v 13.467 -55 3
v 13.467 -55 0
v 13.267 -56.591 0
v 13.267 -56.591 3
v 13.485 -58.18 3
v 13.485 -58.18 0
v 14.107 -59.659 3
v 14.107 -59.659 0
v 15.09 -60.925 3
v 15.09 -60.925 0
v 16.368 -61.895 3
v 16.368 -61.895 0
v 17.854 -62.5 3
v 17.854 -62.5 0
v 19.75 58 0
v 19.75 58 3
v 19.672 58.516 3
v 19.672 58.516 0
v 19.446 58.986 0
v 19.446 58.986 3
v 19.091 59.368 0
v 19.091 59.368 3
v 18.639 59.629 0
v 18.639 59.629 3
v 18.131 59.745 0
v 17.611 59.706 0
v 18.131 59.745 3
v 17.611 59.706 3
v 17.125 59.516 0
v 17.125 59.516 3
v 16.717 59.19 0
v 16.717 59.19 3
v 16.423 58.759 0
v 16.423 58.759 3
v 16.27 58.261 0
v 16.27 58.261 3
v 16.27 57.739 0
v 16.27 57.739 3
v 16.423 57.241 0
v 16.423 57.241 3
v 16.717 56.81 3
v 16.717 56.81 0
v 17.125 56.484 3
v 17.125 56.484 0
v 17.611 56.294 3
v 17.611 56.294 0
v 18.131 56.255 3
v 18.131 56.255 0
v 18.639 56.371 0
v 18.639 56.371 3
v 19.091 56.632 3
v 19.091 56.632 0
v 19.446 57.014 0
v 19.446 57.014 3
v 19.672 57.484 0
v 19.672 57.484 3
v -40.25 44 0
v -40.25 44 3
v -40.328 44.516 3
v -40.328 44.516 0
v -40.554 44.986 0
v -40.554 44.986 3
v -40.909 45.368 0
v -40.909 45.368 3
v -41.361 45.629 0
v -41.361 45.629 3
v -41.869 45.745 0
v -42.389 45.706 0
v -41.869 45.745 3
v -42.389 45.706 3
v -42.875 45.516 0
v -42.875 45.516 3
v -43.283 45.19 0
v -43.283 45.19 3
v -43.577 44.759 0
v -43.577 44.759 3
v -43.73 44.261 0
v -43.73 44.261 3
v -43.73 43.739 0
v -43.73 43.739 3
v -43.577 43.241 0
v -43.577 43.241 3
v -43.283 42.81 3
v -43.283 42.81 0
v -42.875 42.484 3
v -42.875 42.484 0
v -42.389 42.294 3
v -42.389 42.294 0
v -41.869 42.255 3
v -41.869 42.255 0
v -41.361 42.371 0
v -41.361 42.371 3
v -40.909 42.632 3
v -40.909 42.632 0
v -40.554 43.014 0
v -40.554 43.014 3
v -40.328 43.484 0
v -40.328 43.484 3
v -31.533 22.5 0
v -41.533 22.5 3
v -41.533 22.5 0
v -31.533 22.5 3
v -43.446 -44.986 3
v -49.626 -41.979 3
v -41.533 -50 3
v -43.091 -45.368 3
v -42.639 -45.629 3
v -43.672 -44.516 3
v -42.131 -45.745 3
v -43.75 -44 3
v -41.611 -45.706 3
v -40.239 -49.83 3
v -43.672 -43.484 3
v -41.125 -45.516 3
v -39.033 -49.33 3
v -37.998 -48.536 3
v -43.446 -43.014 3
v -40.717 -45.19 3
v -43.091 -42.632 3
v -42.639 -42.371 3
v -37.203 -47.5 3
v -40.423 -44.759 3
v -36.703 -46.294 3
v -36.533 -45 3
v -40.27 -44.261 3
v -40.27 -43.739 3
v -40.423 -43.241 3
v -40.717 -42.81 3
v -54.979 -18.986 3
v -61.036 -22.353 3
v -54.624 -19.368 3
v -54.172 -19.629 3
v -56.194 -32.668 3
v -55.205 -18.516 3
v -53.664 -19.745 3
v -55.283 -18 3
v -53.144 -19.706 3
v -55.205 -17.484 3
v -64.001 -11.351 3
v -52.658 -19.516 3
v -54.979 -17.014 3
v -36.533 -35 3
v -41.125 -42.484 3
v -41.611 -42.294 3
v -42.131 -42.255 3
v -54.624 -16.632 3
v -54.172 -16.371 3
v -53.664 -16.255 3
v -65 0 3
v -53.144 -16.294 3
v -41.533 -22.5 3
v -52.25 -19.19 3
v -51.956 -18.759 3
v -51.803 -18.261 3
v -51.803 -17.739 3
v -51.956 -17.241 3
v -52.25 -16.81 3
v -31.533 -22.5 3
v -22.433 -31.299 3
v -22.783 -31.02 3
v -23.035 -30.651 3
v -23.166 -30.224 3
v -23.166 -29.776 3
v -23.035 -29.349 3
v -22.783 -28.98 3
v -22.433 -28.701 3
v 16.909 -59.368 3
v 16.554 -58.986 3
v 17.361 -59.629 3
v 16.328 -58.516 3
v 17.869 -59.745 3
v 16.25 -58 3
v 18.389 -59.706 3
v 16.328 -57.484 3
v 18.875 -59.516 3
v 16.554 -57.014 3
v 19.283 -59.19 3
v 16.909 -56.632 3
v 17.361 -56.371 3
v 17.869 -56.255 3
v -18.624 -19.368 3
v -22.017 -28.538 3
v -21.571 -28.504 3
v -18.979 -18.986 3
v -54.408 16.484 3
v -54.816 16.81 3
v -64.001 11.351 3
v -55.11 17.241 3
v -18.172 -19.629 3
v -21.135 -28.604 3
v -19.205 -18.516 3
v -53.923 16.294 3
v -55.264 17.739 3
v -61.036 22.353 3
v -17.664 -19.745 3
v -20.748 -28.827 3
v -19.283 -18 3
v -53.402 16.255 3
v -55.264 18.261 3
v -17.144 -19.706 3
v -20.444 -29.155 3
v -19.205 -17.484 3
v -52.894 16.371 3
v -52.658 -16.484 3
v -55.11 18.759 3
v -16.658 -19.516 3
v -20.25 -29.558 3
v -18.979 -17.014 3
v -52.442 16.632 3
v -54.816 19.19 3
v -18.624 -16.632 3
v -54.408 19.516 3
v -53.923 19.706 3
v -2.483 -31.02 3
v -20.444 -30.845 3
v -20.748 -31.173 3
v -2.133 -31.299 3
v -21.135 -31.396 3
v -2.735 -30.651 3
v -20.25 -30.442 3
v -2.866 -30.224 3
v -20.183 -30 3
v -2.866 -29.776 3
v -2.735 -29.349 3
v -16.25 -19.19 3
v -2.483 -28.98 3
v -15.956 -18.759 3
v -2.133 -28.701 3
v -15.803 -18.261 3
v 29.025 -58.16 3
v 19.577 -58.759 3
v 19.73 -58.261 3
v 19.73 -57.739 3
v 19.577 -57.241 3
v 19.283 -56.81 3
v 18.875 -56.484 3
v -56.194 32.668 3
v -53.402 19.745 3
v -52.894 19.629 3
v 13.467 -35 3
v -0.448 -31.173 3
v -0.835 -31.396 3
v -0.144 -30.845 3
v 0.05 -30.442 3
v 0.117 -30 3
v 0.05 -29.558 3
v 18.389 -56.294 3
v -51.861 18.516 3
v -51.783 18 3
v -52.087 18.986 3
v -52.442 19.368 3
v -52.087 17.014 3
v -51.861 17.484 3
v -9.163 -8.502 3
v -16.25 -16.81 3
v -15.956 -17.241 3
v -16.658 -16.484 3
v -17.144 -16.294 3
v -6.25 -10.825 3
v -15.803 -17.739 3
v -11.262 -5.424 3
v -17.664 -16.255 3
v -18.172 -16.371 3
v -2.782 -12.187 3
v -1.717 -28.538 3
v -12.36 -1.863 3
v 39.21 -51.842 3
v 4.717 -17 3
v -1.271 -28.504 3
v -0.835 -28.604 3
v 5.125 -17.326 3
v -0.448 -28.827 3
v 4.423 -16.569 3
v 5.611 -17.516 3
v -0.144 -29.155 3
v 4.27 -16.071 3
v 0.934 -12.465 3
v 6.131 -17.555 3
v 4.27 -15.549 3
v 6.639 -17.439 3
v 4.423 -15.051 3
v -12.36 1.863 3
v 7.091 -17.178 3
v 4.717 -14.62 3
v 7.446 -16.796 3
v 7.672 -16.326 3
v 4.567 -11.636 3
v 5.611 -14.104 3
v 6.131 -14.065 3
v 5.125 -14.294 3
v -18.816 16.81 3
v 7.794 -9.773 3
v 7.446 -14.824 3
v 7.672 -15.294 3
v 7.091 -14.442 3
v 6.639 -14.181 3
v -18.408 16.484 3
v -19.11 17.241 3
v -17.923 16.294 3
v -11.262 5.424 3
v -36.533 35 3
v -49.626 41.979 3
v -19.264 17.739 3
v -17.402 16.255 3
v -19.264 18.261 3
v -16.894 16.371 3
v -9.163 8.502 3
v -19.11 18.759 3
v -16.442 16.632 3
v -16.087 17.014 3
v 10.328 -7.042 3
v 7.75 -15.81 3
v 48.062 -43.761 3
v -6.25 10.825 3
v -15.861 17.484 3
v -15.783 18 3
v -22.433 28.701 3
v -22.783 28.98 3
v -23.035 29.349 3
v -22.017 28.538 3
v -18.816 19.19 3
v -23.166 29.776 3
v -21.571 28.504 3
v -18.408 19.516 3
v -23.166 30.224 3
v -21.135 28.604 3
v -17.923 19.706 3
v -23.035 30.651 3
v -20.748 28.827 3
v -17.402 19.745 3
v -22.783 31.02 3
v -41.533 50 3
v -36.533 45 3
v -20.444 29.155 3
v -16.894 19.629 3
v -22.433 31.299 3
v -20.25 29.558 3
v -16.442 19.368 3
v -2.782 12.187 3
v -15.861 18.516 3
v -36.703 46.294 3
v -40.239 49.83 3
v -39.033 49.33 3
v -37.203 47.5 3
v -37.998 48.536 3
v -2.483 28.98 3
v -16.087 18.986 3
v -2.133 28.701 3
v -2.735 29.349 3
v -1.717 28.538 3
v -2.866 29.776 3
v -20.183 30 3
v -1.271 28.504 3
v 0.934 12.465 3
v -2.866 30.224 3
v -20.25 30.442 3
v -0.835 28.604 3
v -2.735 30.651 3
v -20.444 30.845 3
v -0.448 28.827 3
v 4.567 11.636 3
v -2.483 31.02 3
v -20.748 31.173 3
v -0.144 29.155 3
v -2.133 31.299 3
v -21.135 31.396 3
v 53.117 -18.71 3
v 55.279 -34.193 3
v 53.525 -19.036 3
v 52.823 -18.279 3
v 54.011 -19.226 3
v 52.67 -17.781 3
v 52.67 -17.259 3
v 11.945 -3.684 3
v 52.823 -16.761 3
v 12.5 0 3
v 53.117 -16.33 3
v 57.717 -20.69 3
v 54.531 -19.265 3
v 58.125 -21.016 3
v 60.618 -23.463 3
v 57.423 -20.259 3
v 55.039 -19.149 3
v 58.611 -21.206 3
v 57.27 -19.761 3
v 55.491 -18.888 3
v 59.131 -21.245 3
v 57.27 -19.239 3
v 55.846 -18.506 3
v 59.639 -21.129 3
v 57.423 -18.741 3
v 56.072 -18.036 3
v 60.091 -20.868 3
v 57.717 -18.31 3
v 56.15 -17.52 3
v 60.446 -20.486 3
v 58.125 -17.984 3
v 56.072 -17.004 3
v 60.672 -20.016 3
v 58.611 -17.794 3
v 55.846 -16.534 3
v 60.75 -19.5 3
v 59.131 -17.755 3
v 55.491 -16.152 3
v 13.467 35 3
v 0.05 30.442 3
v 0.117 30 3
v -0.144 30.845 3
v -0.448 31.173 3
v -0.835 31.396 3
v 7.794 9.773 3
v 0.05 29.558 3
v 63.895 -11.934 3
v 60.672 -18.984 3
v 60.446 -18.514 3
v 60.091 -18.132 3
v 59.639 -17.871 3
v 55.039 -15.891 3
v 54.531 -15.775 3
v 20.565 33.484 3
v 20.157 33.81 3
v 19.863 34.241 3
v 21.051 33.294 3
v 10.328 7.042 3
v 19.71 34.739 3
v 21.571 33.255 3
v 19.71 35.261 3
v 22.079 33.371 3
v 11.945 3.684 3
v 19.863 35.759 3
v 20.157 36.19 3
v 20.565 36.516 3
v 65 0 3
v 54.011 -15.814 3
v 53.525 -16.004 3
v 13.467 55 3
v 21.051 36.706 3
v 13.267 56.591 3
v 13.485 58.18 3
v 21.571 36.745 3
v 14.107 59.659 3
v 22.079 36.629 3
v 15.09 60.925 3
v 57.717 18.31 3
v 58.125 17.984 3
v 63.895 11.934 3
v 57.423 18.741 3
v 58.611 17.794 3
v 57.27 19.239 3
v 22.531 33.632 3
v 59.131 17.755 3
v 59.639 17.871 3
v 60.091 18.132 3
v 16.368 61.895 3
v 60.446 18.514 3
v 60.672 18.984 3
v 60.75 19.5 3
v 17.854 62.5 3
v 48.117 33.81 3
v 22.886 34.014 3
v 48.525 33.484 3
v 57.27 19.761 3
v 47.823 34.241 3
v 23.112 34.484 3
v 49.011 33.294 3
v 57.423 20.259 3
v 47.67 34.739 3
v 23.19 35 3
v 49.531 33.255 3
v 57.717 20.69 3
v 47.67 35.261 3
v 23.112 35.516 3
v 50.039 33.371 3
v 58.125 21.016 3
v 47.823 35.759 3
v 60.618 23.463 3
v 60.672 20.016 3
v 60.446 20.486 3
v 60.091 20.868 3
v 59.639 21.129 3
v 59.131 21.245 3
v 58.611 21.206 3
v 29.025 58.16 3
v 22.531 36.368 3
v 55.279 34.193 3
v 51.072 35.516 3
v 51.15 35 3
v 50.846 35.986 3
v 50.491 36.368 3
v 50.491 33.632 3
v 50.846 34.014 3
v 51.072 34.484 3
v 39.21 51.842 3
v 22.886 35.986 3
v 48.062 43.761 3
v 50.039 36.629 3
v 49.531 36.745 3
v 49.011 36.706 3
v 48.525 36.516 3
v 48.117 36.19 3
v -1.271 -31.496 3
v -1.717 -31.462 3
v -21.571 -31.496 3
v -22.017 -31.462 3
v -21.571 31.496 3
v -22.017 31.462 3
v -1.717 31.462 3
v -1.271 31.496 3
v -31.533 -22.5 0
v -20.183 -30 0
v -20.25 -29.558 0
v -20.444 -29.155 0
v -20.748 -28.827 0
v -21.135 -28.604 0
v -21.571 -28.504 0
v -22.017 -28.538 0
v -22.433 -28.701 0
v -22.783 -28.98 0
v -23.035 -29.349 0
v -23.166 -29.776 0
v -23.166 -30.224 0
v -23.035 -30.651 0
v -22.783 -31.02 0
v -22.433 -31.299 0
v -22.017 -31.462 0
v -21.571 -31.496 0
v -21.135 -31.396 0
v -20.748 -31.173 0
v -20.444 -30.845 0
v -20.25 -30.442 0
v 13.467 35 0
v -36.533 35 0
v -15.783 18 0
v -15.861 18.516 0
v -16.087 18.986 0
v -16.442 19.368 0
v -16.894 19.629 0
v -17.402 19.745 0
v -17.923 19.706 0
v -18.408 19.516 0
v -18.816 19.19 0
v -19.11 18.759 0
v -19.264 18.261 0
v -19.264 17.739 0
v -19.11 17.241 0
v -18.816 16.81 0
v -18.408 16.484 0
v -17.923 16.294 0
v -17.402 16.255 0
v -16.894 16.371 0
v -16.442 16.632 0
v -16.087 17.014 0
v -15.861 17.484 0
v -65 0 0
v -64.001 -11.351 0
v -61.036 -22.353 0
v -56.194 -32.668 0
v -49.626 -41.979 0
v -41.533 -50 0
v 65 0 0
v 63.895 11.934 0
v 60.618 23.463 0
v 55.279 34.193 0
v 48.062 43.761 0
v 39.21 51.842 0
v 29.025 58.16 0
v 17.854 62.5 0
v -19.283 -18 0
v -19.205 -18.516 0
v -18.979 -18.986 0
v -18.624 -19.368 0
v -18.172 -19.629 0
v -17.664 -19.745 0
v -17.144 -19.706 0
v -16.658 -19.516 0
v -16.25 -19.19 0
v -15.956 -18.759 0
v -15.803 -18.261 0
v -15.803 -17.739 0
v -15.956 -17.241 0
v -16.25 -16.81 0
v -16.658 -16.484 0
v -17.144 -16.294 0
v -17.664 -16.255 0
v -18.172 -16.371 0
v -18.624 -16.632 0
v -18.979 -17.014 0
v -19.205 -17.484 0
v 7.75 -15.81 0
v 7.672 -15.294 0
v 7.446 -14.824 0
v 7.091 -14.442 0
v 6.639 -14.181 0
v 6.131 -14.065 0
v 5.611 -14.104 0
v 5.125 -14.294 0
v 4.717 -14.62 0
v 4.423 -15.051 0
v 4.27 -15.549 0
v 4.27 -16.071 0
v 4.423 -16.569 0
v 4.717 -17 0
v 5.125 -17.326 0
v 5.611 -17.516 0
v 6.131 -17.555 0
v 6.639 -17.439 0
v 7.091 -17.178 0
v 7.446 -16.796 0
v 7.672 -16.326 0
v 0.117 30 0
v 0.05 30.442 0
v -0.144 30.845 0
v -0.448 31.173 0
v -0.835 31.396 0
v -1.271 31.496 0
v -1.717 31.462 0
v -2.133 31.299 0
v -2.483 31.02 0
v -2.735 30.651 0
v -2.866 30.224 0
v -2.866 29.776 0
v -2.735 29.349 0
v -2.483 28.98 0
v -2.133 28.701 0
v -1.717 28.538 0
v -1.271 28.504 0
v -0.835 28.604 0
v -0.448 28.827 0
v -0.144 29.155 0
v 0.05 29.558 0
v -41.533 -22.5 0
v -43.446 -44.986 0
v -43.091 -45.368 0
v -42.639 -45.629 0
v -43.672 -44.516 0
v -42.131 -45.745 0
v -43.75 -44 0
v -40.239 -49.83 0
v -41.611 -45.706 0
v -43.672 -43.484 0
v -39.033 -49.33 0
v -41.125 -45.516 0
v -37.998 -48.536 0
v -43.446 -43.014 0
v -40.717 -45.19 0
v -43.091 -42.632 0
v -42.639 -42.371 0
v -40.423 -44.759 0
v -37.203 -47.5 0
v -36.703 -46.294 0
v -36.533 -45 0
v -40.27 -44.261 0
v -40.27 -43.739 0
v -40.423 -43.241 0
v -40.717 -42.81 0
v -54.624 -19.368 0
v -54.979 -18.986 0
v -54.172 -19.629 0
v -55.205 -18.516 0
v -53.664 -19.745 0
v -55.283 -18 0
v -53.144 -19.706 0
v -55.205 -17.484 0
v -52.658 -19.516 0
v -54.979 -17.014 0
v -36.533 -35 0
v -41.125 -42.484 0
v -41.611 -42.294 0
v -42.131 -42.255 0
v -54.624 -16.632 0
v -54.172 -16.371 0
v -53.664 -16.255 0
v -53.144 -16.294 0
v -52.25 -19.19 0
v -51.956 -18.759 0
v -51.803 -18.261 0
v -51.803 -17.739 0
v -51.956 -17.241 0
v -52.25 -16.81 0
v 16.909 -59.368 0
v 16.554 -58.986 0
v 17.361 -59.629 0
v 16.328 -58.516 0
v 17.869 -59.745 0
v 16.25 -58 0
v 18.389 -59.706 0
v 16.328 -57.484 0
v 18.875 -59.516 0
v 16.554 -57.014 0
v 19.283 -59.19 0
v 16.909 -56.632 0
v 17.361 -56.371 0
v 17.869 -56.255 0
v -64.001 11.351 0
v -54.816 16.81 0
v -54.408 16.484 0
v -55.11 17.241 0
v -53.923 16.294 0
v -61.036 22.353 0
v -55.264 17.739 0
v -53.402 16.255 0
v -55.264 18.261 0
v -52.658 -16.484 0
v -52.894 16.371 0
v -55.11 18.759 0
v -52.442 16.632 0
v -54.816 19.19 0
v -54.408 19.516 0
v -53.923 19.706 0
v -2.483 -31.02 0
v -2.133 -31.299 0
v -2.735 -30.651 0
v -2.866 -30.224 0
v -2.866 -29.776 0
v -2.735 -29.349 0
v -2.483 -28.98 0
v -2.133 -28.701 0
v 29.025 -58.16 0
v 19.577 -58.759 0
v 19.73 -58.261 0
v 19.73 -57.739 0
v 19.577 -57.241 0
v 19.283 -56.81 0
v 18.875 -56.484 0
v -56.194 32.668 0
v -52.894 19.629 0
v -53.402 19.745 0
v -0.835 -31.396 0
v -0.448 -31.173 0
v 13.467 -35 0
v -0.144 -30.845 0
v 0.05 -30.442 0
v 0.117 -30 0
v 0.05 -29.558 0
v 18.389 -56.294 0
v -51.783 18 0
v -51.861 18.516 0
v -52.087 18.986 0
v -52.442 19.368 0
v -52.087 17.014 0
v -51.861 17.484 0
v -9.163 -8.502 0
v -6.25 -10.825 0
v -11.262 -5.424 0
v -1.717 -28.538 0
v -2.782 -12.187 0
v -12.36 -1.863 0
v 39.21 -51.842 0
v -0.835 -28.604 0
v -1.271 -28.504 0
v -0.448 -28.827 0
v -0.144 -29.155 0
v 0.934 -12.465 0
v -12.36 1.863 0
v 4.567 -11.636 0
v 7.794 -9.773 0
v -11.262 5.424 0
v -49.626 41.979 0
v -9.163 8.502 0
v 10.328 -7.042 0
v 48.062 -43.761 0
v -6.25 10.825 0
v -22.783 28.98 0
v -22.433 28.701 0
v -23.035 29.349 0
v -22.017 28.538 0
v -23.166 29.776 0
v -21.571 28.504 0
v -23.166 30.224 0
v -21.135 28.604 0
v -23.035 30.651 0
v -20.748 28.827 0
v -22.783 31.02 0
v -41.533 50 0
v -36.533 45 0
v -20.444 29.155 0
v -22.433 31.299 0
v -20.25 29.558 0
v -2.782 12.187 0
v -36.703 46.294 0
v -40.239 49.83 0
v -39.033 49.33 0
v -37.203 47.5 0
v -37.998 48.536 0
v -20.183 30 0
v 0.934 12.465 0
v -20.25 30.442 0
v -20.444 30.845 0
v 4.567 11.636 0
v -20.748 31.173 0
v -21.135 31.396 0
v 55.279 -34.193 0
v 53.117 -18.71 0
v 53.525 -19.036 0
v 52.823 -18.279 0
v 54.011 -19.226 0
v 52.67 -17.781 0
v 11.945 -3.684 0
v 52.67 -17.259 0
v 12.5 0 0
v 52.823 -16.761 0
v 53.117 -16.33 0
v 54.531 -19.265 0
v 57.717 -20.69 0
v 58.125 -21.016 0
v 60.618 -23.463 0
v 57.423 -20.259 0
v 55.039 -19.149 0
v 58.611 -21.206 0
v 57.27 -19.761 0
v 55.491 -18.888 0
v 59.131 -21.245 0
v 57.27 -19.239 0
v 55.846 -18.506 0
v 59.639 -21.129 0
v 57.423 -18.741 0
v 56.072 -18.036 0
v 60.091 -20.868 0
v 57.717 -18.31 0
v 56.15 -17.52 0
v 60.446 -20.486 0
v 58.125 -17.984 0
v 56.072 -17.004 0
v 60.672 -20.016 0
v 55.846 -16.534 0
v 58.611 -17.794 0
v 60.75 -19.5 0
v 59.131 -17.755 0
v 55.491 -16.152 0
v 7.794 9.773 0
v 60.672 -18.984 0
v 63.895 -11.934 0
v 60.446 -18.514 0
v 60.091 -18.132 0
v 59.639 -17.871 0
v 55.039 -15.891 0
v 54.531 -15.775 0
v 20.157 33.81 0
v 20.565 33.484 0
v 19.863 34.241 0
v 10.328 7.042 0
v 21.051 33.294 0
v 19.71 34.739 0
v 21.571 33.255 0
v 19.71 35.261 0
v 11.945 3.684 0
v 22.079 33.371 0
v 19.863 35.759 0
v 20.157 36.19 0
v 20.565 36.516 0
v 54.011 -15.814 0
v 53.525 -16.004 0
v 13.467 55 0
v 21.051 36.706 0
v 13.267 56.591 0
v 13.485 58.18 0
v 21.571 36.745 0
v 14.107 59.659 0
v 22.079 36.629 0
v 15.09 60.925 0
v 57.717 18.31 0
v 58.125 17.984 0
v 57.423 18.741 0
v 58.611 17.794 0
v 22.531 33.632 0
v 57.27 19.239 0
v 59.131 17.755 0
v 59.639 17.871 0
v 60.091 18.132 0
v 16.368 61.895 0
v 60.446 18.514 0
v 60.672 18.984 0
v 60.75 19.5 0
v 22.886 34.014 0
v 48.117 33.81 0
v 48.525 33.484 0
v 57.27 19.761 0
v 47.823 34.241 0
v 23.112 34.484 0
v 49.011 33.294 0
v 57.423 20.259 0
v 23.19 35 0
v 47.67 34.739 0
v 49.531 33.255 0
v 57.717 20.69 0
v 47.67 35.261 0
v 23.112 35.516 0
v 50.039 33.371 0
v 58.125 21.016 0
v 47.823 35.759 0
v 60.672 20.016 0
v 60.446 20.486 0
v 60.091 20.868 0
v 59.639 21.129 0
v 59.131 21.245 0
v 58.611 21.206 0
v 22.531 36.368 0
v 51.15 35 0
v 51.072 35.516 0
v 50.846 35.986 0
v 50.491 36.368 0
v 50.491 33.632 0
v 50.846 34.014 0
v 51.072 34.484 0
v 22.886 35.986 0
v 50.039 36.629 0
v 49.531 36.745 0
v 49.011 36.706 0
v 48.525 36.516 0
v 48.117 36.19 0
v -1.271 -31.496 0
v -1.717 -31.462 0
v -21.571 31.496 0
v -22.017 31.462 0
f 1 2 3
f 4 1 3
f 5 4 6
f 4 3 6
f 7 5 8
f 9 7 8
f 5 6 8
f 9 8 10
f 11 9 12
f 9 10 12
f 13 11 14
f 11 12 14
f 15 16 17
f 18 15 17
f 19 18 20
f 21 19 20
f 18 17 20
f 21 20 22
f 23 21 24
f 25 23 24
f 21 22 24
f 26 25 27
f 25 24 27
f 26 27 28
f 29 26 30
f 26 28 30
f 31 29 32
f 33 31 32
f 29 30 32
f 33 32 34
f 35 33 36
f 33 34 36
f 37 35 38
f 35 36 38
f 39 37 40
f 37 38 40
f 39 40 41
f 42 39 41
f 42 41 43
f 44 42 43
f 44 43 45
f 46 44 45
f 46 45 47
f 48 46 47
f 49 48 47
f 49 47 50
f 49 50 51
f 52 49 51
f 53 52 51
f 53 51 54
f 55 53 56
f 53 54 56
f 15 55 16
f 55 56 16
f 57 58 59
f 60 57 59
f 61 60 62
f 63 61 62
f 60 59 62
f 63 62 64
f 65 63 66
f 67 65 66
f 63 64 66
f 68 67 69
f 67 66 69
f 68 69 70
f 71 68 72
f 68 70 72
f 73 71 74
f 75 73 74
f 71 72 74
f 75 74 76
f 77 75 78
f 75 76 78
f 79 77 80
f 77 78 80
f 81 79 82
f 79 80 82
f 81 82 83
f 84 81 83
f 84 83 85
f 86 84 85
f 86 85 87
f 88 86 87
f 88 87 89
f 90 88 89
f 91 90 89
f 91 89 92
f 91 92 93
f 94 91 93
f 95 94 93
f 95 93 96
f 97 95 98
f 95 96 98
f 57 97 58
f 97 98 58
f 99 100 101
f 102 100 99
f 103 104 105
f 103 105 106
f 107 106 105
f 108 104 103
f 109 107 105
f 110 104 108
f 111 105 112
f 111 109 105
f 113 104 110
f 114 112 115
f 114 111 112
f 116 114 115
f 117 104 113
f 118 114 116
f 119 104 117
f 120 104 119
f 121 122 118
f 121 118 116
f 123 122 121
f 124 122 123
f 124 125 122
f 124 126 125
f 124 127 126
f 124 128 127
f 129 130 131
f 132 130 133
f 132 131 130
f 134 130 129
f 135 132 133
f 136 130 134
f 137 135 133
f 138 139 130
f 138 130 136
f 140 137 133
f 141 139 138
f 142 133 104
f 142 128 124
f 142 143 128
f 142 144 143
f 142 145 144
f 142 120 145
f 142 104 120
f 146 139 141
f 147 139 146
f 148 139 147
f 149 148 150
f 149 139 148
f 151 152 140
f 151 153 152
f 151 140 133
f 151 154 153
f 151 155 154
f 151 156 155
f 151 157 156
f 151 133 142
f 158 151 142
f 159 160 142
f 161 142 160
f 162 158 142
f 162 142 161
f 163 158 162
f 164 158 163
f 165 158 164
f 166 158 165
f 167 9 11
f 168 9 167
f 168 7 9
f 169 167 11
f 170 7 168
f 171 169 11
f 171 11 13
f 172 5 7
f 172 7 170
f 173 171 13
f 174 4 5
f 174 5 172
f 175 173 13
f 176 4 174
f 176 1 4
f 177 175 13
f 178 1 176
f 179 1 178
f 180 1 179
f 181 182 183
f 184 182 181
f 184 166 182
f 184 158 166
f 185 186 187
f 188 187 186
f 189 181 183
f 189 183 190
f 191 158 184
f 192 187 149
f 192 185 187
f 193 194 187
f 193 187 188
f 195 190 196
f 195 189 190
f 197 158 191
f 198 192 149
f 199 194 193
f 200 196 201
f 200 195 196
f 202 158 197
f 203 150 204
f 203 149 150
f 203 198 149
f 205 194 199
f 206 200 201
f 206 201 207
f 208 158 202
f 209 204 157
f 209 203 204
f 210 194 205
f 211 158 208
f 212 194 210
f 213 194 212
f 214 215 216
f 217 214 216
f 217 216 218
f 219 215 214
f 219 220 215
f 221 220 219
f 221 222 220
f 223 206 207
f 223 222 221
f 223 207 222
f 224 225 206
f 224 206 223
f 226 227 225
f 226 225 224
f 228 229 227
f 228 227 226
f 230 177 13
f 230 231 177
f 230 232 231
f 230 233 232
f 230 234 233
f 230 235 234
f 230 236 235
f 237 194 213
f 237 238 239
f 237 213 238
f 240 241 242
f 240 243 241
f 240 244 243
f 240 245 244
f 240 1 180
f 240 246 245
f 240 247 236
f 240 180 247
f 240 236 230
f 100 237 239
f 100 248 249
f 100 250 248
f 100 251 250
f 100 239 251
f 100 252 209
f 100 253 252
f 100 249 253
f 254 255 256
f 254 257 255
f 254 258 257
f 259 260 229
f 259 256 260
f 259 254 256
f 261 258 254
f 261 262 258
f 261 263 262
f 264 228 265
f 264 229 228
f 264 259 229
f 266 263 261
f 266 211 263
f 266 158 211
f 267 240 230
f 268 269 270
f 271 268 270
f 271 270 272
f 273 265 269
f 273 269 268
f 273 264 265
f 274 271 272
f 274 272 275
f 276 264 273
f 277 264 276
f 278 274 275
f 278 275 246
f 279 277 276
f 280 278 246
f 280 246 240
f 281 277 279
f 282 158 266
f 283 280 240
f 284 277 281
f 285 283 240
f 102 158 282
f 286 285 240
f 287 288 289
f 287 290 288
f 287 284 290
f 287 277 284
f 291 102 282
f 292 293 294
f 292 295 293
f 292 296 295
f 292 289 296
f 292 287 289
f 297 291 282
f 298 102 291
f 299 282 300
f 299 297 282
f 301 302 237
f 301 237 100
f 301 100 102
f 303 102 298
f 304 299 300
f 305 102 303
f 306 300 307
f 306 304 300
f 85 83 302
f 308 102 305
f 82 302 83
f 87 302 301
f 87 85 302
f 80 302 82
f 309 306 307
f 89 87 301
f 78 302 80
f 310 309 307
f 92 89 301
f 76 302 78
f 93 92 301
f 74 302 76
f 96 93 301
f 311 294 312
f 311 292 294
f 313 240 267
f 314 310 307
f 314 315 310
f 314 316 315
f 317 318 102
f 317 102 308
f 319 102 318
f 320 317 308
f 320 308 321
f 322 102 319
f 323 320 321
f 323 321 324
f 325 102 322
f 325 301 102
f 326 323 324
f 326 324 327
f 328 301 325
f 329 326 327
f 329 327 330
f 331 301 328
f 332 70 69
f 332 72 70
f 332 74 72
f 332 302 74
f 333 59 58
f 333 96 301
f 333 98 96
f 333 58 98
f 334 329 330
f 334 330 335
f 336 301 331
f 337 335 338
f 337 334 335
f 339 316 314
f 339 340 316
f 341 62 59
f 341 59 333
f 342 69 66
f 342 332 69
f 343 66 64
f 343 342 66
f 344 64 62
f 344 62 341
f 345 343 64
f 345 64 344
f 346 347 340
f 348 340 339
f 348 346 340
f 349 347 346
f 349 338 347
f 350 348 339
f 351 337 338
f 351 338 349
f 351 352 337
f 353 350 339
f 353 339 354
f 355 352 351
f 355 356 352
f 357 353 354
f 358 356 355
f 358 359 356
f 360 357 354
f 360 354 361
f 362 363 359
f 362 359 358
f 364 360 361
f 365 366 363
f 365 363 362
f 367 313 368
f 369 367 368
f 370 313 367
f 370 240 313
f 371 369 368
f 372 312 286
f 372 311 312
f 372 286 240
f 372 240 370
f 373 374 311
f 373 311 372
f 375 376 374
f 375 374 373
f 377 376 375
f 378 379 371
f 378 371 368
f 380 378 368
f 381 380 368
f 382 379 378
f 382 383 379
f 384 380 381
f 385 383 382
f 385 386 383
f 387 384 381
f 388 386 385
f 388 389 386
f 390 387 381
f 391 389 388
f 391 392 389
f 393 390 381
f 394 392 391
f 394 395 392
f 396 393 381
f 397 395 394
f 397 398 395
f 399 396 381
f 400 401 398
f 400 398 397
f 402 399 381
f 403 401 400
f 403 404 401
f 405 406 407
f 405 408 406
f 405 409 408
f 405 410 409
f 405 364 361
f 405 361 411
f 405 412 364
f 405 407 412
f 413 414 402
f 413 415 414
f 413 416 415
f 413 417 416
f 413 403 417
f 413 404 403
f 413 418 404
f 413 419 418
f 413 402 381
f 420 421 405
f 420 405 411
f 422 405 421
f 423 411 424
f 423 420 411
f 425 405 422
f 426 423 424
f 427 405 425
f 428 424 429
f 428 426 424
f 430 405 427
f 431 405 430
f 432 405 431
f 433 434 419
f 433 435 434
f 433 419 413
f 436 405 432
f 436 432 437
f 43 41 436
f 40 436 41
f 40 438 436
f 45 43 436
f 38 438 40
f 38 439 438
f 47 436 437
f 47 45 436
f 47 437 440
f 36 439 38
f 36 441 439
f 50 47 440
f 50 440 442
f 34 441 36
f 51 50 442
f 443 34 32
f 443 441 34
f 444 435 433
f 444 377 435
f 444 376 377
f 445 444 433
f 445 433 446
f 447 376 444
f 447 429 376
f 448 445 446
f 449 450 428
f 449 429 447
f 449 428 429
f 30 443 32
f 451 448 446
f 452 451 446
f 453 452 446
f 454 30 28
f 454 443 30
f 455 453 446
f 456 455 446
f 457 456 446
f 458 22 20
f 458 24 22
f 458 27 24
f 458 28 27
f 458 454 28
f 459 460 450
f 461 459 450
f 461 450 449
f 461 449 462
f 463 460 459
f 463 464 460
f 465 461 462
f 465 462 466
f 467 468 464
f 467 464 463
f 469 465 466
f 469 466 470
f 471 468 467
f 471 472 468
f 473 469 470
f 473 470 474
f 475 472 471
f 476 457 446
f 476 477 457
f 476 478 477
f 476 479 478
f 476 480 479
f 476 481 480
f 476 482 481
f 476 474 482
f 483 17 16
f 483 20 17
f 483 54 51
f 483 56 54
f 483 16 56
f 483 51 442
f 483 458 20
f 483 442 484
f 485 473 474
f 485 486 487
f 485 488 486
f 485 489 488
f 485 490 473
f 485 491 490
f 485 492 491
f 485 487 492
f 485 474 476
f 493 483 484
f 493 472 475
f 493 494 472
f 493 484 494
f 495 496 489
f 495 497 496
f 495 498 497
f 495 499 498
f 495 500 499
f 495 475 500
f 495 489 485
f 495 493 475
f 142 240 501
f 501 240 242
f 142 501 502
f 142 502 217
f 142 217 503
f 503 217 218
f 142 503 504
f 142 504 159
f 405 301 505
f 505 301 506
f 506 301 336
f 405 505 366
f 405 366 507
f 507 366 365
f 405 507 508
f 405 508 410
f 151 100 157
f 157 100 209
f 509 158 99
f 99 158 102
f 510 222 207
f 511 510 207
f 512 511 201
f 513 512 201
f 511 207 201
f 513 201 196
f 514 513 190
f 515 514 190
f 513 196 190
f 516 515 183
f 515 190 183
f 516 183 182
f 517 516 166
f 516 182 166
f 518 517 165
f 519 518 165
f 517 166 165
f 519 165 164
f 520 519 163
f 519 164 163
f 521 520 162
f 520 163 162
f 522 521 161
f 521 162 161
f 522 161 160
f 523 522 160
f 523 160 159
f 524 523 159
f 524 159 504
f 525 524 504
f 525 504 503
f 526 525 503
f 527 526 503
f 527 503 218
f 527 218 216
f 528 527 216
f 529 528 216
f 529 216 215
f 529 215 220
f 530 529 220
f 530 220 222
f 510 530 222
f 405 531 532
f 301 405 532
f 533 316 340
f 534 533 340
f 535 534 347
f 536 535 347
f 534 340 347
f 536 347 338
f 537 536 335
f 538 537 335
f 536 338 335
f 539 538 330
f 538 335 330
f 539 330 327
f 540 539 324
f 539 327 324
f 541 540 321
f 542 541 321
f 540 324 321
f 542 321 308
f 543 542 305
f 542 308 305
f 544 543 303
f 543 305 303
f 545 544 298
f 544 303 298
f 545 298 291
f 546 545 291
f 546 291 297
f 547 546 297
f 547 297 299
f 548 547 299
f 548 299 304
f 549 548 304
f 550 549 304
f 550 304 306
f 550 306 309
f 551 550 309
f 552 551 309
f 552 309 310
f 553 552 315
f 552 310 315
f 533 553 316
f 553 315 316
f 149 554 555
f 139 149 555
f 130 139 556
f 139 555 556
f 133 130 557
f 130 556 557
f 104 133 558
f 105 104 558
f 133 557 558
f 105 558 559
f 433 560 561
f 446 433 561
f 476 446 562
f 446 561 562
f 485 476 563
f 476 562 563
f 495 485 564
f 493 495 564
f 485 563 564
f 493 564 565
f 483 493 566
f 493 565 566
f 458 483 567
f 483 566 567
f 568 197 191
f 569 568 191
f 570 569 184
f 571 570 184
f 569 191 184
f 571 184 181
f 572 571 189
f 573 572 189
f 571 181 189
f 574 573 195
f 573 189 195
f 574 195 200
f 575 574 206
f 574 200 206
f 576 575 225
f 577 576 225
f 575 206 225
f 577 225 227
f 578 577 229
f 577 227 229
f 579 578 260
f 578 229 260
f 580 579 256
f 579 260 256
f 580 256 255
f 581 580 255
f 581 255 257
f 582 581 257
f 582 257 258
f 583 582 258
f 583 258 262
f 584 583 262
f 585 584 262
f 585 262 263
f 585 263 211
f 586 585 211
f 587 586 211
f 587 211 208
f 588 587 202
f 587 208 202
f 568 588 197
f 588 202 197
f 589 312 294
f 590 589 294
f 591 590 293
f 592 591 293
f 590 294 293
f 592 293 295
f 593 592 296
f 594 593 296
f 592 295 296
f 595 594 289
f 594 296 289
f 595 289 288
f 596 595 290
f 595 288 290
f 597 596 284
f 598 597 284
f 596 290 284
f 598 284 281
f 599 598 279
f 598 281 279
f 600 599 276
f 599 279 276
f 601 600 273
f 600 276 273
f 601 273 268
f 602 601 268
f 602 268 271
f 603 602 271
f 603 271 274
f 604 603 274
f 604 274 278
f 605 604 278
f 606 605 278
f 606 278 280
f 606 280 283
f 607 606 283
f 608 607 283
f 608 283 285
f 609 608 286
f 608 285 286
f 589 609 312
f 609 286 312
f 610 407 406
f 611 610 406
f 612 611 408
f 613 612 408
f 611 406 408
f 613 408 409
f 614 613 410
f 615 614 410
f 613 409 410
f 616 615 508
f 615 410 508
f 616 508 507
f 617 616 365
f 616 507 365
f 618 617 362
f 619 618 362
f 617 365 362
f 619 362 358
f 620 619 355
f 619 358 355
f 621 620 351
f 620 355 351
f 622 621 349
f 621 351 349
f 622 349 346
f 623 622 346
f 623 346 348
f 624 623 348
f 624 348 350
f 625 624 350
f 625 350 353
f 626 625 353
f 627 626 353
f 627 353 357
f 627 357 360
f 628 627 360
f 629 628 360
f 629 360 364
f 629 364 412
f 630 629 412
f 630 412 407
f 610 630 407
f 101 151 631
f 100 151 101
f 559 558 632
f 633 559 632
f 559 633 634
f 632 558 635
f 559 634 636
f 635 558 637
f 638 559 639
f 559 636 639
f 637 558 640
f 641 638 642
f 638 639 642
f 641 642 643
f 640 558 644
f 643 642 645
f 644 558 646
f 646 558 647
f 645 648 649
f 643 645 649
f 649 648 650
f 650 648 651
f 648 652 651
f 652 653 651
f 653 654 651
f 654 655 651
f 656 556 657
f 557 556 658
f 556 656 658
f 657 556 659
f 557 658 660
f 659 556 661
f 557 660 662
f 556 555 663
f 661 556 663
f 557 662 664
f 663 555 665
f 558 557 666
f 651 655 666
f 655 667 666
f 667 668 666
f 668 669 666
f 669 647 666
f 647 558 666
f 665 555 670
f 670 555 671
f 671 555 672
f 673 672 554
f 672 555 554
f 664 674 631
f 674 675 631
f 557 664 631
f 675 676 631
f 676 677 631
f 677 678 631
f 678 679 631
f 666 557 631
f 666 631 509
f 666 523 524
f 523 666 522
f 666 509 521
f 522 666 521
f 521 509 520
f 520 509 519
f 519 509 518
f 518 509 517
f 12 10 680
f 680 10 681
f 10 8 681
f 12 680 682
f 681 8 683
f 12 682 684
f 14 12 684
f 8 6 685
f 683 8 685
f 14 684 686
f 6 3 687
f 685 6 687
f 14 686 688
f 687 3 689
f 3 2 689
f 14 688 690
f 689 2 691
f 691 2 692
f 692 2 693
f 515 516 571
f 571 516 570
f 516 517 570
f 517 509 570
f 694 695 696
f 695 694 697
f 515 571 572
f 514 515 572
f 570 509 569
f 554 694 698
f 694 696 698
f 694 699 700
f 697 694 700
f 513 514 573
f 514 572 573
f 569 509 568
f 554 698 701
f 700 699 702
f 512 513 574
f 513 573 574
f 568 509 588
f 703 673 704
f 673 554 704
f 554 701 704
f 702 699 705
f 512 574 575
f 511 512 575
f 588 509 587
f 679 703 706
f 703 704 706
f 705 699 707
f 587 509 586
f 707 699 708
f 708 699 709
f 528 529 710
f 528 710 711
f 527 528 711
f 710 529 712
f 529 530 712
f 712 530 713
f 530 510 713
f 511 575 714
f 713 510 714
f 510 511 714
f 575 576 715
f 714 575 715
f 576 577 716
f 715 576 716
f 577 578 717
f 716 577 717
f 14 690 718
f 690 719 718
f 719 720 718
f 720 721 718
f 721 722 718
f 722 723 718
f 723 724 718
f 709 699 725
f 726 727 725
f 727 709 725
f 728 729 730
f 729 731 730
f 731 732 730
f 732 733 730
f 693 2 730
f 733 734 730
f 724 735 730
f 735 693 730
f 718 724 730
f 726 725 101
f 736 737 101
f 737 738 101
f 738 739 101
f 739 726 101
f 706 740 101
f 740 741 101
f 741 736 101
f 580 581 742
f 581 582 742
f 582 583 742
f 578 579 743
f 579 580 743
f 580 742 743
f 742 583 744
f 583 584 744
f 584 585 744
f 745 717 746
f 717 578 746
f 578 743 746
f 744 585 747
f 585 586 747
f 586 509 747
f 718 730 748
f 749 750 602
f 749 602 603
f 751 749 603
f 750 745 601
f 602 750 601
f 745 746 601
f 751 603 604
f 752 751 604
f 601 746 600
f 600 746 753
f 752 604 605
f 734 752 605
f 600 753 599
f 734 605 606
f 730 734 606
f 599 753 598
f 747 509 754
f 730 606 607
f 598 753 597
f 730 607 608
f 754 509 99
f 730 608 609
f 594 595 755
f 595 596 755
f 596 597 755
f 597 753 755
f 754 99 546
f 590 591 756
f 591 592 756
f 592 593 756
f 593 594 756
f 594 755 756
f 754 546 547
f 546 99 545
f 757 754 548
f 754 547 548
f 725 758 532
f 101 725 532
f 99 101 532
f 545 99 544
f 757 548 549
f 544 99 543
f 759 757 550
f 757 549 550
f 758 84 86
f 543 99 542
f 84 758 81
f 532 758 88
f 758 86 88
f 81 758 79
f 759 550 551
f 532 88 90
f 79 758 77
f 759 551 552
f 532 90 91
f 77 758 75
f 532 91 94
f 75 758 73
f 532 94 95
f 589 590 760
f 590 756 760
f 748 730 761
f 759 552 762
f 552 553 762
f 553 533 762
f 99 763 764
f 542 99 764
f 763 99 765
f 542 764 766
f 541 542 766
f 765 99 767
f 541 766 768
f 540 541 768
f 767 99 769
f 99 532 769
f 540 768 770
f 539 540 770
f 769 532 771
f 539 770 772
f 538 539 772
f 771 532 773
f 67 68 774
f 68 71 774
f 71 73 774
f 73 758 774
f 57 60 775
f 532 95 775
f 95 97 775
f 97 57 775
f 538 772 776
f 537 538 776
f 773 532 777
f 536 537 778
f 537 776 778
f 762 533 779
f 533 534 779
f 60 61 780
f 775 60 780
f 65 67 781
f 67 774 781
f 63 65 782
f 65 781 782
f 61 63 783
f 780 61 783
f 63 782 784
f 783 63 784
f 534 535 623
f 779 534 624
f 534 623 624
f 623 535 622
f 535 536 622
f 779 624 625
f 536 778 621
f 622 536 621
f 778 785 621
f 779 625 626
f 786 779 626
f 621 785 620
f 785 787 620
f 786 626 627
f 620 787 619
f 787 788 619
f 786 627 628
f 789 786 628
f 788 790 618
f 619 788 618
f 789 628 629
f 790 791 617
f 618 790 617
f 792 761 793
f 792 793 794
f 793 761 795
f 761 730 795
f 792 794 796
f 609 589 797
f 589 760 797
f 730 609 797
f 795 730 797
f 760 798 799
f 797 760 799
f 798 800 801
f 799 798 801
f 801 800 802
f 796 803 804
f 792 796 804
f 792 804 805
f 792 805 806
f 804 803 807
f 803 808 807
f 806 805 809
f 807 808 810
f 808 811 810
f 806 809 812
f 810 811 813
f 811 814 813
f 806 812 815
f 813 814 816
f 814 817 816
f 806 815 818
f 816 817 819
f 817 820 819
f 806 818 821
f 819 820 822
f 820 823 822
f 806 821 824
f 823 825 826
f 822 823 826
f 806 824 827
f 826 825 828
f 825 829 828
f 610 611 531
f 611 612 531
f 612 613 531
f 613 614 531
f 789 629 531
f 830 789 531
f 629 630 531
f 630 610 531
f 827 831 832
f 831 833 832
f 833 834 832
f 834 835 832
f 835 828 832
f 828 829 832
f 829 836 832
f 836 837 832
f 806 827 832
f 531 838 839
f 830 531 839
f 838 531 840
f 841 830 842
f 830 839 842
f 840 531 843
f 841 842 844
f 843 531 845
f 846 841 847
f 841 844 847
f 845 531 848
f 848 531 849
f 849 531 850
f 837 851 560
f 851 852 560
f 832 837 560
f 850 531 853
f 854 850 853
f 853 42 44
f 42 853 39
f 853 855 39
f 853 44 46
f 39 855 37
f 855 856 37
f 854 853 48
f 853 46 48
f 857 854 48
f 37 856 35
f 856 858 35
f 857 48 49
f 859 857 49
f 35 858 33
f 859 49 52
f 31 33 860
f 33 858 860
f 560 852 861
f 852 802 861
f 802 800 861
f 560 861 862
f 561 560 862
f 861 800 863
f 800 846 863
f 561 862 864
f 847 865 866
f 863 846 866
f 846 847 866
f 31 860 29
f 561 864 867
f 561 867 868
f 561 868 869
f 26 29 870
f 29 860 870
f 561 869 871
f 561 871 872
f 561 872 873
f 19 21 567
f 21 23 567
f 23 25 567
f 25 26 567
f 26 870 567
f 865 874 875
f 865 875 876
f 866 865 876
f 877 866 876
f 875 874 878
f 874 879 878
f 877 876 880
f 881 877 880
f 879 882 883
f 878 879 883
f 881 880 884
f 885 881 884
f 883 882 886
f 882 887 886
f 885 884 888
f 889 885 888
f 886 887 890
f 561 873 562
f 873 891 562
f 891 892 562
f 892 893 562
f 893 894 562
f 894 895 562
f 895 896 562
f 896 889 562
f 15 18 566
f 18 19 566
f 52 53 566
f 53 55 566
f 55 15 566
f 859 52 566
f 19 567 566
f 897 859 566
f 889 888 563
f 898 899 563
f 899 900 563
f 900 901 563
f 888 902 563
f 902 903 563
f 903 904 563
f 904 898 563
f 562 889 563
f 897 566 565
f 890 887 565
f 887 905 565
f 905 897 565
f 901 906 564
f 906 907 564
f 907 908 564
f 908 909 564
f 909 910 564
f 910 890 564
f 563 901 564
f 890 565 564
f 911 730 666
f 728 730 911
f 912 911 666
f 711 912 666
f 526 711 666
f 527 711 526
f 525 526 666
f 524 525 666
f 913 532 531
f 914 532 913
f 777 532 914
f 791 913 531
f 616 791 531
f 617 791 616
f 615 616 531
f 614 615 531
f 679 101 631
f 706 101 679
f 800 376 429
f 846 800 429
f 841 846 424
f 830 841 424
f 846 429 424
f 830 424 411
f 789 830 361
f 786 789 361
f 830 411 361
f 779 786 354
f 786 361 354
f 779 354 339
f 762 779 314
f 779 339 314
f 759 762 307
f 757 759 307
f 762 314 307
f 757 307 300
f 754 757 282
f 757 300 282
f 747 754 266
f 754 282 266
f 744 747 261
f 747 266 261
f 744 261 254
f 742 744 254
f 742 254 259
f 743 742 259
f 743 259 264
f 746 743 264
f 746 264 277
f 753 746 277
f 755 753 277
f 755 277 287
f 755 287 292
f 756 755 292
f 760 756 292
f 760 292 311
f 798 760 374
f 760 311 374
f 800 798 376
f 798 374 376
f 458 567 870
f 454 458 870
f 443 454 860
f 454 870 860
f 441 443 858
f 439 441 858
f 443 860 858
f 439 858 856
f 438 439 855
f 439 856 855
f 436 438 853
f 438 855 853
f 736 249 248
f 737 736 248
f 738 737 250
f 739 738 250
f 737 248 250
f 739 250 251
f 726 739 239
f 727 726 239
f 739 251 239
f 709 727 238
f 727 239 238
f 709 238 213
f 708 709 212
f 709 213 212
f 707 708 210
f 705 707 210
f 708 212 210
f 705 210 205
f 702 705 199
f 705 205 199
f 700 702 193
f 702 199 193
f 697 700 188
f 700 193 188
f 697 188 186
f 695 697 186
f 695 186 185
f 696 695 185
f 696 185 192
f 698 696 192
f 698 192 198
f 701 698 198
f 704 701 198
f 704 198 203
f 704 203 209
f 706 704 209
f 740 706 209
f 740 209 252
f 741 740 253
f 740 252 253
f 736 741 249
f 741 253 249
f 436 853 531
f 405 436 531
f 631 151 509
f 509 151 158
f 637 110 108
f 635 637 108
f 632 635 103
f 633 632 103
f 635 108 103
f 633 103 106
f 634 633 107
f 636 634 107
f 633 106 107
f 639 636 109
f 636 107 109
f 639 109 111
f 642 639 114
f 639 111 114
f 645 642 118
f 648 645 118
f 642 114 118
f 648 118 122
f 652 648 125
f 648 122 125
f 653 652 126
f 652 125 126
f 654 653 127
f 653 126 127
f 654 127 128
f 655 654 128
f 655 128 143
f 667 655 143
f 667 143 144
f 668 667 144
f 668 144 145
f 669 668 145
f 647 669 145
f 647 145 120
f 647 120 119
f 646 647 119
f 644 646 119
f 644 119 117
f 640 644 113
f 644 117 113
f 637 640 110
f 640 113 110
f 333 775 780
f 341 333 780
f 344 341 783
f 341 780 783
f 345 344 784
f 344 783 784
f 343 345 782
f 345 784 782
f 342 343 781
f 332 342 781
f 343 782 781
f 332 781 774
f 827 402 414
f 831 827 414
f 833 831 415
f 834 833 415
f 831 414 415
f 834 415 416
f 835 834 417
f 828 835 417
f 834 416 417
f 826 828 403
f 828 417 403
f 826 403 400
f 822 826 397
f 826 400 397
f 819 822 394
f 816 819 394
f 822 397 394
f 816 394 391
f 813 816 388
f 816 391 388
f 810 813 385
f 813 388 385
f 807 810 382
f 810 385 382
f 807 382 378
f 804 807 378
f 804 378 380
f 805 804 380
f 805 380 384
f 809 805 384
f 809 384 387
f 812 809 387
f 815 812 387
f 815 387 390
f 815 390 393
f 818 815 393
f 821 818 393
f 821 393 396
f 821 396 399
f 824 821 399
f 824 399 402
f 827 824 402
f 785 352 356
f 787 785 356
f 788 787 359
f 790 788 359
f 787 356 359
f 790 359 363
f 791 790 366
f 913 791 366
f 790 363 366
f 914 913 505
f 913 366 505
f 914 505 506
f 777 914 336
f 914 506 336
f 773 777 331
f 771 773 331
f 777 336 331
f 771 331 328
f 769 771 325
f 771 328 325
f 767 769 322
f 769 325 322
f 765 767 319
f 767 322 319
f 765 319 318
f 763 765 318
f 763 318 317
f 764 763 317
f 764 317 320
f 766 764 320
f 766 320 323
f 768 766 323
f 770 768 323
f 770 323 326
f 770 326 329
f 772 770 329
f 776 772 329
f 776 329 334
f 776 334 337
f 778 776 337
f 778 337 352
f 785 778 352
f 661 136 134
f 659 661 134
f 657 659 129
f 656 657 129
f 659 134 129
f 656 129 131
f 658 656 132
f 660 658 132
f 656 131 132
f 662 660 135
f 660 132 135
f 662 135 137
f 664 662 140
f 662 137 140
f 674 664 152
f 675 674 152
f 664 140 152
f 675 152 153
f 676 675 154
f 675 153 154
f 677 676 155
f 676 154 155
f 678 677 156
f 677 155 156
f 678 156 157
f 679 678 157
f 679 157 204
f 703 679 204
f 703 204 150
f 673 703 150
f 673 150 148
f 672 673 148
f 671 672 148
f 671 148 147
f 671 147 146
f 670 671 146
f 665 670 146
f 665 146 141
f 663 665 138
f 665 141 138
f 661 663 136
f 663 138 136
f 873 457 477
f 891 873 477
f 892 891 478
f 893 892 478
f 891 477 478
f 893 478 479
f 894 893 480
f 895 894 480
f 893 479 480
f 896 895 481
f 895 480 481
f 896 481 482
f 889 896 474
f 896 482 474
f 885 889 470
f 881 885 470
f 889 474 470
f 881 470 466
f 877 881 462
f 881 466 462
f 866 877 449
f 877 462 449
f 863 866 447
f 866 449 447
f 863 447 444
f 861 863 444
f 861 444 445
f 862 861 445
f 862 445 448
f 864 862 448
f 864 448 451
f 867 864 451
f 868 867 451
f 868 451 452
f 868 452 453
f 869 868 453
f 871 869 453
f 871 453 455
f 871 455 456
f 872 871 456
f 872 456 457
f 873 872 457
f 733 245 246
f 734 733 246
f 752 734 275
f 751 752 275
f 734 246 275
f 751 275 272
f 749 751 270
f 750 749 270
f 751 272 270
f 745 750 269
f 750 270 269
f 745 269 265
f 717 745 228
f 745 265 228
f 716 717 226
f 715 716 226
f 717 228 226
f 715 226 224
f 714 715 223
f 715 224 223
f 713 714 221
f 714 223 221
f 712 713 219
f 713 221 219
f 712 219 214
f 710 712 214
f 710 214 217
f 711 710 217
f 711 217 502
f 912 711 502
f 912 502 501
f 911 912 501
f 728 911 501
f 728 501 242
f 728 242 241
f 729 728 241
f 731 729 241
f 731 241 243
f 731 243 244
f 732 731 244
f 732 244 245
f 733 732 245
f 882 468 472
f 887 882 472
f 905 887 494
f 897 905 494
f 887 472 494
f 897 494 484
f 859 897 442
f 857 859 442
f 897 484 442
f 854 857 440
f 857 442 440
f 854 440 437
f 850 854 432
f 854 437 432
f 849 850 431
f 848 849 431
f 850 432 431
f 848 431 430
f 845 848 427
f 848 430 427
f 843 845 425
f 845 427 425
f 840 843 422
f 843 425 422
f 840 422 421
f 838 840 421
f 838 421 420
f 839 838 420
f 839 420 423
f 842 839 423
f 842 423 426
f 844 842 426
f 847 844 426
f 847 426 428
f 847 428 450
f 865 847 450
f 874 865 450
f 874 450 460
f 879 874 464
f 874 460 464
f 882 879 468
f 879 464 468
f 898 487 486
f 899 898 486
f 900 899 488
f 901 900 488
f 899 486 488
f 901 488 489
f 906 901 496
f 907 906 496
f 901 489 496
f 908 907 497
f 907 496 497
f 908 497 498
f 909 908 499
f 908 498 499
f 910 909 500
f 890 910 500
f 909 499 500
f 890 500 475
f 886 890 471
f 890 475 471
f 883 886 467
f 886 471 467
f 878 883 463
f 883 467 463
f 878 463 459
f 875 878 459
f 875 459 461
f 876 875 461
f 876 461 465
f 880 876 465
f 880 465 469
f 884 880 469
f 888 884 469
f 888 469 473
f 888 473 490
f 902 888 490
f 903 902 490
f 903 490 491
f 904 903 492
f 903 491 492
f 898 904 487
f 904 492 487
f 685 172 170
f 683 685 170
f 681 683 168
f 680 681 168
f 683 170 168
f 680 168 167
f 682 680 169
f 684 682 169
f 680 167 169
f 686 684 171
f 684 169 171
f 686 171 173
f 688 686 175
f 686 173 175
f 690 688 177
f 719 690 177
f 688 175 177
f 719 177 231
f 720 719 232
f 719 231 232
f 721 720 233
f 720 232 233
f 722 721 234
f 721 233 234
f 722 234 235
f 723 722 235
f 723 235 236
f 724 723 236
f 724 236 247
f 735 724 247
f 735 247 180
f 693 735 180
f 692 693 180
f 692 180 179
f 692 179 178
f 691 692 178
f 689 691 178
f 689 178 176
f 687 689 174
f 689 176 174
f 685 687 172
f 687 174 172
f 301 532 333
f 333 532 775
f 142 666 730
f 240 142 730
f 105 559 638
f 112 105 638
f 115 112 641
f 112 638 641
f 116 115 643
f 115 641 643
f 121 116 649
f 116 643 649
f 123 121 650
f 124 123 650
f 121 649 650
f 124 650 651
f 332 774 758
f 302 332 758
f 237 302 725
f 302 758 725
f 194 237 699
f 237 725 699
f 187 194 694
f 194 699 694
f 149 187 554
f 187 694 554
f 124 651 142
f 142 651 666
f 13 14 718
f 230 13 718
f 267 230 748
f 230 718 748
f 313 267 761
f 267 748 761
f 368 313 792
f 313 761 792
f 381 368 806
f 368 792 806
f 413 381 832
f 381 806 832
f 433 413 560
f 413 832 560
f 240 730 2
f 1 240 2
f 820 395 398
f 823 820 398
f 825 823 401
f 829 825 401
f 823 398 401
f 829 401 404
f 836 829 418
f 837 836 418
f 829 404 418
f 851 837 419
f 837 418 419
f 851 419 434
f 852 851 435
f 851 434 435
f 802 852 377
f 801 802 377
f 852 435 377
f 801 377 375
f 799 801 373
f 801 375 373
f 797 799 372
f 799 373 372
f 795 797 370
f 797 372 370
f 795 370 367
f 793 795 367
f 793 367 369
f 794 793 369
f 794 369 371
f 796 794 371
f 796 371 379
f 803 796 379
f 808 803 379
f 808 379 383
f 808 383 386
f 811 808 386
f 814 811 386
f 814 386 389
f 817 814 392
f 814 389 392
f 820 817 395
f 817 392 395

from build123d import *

# Parameters (mm, degrees)
SALIENTE_EXTRUIR1_DEPTH = 3
CROQUIS2_R              = 12.5
CROQUIS2_W              = 10
CROQUIS2_H              = 45
CORTAR_EXTRUIR1_DEPTH   = 3
CROQUIS4_R              = 1.75
CORTAR_EXTRUIR2_DEPTH   = 3
CROQUIS5_R              = 1.75
CORTAR_EXTRUIR3_DEPTH   = 3
CROQUIS6_R              = 1.75
CORTAR_EXTRUIR4_DEPTH   = 3
CROQUIS7_R              = 1.5
CORTAR_EXTRUIR5_DEPTH   = 10
CROQUIS8_R              = 1.75
CORTAR_EXTRUIR6_DEPTH   = 10


with BuildPart() as part:
    # Croquis1 → Saliente-Extruir1 (new body)
    with BuildSketch(Plane.XY):
        with BuildLine():
            Line((-41.533119315, 0), (-41.533119315, 50))
            ThreePointArc((-41.533119315, 50), (-58.84153616, 27.616546168), (-65, 0))
            Line((-65, 0), (-41.533119315, 0))
        make_face()
        with BuildLine():
            Line((-41.533119315, -50), (-41.533119315, 0))
            Line((-41.533119315, 0), (-65, 0))
            ThreePointArc((-65, 0), (-58.84153616, -27.616546168), (-41.533119315, -50))
        make_face()
        with BuildLine():
            Line((17.853571071, 0), (-41.533119315, 0))
            Line((-41.533119315, 0), (-41.533119315, -50))
            ThreePointArc((-41.533119315, -50), (-37.997585409, -48.535533906), (-36.533119315, -45))
            Line((-36.533119315, -45), (-36.533119315, -35))
            Line((-36.533119315, -35), (13.466880685, -35))
            Line((13.466880685, -35), (13.466880685, -55))
            ThreePointArc((13.466880685, -55), (14.106925019, -59.658513326), (17.853571071, -62.5))
            Line((17.853571071, -62.5), (17.853571071, 0))
        make_face()
        with BuildLine():
            ThreePointArc((-36.533119315, 45), (-37.997585409, 48.535533906), (-41.533119315, 50))
            Line((-41.533119315, 50), (-41.533119315, 0))
            Line((-41.533119315, 0), (17.853571071, 0))
            Line((17.853571071, 0), (17.853571071, 62.5))
            ThreePointArc((17.853571071, 62.5), (14.106925019, 59.658513326), (13.466880685, 55))
            Line((13.466880685, 55), (13.466880685, 35))
            Line((13.466880685, 35), (-36.533119315, 35))
            Line((-36.533119315, 35), (-36.533119315, 45))
        make_face()
        with BuildLine():
            ThreePointArc((65, 0), (51.891628032, 39.144079248), (17.853571071, 62.5))
            Line((17.853571071, 62.5), (17.853571071, 0))
            Line((17.853571071, 0), (65, 0))
        make_face()
        with BuildLine():
            Line((65, 0), (17.853571071, 0))
            Line((17.853571071, 0), (17.853571071, -62.5))
            ThreePointArc((17.853571071, -62.5), (51.891628032, -39.144079248), (65, 0))
        make_face()
    extrude(amount=SALIENTE_EXTRUIR1_DEPTH)

    # Croquis2 → Cortar-Extruir1 (cut)
    with BuildSketch(Plane.XY.offset(3)):
        Circle(CROQUIS2_R)
        with Locations((-36.533119315, 0)):
            Rectangle(CROQUIS2_W, CROQUIS2_H)
    extrude(amount=-CORTAR_EXTRUIR1_DEPTH, mode=Mode.SUBTRACT)

    # Croquis4 → Cortar-Extruir2 (cut)
    with BuildSketch(Plane.XY.offset(3)):
        with Locations((-53.533119315, 18)):
            Circle(CROQUIS4_R)
        with Locations((-17.533119315, 18)):
            Circle(CROQUIS4_R)
        with Locations(Location((-17.533119315, -18, 0), (0, 0, 180))):
            Circle(CROQUIS4_R)
        with Locations(Location((-53.533119315, -18, 0), (0, 0, 180))):
            Circle(CROQUIS4_R)
    extrude(amount=-CORTAR_EXTRUIR2_DEPTH, mode=Mode.SUBTRACT)

    # Croquis5 → Cortar-Extruir3 (cut)
    with BuildSketch(Plane.XY.offset(3)):
        with Locations((-42, 44)):
            Circle(CROQUIS5_R)
        with Locations((18, 58)):
            Circle(CROQUIS5_R)
        with Locations(Location((18, -58, 0), (0, 0, 180))):
            Circle(CROQUIS5_R)
        with Locations(Location((-42, -44, 0), (0, 0, 180))):
            Circle(CROQUIS5_R)
    extrude(amount=-CORTAR_EXTRUIR3_DEPTH, mode=Mode.SUBTRACT)

    # Croquis6 → Cortar-Extruir4 (cut)
    with BuildSketch(Plane.XY.offset(3)):
        with Locations((6, -15.81)):
            Circle(CROQUIS6_R)
        with Locations((54.4, -17.52)):
            Circle(CROQUIS6_R)
        with Locations((49.4, 35)):
            Circle(CROQUIS6_R)
        with Locations((21.44, 35)):
            Circle(CROQUIS6_R)
    extrude(amount=-CORTAR_EXTRUIR4_DEPTH, mode=Mode.SUBTRACT)

    # Croquis7 → Cortar-Extruir5 (cut)
    with BuildSketch(Plane.XY.offset(3)):
        with Locations((-21.683119315, -30)):
            Circle(CROQUIS7_R)
        with Locations((-1.383119315, -30)):
            Circle(CROQUIS7_R)
        with Locations((-1.383119315, 30)):
            Circle(CROQUIS7_R)
        with Locations((-21.683119315, 30)):
            Circle(CROQUIS7_R)
    extrude(amount=-CORTAR_EXTRUIR5_DEPTH, mode=Mode.SUBTRACT)

    # Croquis8 → Cortar-Extruir6 (cut)
    with BuildSketch(Plane.XY.offset(3)):
        with Locations((59, 19.5)):
            Circle(CROQUIS8_R)
        with Locations((59, -19.5)):
            Circle(CROQUIS8_R)
    extrude(amount=-CORTAR_EXTRUIR6_DEPTH, mode=Mode.SUBTRACT)


solid = part.part
